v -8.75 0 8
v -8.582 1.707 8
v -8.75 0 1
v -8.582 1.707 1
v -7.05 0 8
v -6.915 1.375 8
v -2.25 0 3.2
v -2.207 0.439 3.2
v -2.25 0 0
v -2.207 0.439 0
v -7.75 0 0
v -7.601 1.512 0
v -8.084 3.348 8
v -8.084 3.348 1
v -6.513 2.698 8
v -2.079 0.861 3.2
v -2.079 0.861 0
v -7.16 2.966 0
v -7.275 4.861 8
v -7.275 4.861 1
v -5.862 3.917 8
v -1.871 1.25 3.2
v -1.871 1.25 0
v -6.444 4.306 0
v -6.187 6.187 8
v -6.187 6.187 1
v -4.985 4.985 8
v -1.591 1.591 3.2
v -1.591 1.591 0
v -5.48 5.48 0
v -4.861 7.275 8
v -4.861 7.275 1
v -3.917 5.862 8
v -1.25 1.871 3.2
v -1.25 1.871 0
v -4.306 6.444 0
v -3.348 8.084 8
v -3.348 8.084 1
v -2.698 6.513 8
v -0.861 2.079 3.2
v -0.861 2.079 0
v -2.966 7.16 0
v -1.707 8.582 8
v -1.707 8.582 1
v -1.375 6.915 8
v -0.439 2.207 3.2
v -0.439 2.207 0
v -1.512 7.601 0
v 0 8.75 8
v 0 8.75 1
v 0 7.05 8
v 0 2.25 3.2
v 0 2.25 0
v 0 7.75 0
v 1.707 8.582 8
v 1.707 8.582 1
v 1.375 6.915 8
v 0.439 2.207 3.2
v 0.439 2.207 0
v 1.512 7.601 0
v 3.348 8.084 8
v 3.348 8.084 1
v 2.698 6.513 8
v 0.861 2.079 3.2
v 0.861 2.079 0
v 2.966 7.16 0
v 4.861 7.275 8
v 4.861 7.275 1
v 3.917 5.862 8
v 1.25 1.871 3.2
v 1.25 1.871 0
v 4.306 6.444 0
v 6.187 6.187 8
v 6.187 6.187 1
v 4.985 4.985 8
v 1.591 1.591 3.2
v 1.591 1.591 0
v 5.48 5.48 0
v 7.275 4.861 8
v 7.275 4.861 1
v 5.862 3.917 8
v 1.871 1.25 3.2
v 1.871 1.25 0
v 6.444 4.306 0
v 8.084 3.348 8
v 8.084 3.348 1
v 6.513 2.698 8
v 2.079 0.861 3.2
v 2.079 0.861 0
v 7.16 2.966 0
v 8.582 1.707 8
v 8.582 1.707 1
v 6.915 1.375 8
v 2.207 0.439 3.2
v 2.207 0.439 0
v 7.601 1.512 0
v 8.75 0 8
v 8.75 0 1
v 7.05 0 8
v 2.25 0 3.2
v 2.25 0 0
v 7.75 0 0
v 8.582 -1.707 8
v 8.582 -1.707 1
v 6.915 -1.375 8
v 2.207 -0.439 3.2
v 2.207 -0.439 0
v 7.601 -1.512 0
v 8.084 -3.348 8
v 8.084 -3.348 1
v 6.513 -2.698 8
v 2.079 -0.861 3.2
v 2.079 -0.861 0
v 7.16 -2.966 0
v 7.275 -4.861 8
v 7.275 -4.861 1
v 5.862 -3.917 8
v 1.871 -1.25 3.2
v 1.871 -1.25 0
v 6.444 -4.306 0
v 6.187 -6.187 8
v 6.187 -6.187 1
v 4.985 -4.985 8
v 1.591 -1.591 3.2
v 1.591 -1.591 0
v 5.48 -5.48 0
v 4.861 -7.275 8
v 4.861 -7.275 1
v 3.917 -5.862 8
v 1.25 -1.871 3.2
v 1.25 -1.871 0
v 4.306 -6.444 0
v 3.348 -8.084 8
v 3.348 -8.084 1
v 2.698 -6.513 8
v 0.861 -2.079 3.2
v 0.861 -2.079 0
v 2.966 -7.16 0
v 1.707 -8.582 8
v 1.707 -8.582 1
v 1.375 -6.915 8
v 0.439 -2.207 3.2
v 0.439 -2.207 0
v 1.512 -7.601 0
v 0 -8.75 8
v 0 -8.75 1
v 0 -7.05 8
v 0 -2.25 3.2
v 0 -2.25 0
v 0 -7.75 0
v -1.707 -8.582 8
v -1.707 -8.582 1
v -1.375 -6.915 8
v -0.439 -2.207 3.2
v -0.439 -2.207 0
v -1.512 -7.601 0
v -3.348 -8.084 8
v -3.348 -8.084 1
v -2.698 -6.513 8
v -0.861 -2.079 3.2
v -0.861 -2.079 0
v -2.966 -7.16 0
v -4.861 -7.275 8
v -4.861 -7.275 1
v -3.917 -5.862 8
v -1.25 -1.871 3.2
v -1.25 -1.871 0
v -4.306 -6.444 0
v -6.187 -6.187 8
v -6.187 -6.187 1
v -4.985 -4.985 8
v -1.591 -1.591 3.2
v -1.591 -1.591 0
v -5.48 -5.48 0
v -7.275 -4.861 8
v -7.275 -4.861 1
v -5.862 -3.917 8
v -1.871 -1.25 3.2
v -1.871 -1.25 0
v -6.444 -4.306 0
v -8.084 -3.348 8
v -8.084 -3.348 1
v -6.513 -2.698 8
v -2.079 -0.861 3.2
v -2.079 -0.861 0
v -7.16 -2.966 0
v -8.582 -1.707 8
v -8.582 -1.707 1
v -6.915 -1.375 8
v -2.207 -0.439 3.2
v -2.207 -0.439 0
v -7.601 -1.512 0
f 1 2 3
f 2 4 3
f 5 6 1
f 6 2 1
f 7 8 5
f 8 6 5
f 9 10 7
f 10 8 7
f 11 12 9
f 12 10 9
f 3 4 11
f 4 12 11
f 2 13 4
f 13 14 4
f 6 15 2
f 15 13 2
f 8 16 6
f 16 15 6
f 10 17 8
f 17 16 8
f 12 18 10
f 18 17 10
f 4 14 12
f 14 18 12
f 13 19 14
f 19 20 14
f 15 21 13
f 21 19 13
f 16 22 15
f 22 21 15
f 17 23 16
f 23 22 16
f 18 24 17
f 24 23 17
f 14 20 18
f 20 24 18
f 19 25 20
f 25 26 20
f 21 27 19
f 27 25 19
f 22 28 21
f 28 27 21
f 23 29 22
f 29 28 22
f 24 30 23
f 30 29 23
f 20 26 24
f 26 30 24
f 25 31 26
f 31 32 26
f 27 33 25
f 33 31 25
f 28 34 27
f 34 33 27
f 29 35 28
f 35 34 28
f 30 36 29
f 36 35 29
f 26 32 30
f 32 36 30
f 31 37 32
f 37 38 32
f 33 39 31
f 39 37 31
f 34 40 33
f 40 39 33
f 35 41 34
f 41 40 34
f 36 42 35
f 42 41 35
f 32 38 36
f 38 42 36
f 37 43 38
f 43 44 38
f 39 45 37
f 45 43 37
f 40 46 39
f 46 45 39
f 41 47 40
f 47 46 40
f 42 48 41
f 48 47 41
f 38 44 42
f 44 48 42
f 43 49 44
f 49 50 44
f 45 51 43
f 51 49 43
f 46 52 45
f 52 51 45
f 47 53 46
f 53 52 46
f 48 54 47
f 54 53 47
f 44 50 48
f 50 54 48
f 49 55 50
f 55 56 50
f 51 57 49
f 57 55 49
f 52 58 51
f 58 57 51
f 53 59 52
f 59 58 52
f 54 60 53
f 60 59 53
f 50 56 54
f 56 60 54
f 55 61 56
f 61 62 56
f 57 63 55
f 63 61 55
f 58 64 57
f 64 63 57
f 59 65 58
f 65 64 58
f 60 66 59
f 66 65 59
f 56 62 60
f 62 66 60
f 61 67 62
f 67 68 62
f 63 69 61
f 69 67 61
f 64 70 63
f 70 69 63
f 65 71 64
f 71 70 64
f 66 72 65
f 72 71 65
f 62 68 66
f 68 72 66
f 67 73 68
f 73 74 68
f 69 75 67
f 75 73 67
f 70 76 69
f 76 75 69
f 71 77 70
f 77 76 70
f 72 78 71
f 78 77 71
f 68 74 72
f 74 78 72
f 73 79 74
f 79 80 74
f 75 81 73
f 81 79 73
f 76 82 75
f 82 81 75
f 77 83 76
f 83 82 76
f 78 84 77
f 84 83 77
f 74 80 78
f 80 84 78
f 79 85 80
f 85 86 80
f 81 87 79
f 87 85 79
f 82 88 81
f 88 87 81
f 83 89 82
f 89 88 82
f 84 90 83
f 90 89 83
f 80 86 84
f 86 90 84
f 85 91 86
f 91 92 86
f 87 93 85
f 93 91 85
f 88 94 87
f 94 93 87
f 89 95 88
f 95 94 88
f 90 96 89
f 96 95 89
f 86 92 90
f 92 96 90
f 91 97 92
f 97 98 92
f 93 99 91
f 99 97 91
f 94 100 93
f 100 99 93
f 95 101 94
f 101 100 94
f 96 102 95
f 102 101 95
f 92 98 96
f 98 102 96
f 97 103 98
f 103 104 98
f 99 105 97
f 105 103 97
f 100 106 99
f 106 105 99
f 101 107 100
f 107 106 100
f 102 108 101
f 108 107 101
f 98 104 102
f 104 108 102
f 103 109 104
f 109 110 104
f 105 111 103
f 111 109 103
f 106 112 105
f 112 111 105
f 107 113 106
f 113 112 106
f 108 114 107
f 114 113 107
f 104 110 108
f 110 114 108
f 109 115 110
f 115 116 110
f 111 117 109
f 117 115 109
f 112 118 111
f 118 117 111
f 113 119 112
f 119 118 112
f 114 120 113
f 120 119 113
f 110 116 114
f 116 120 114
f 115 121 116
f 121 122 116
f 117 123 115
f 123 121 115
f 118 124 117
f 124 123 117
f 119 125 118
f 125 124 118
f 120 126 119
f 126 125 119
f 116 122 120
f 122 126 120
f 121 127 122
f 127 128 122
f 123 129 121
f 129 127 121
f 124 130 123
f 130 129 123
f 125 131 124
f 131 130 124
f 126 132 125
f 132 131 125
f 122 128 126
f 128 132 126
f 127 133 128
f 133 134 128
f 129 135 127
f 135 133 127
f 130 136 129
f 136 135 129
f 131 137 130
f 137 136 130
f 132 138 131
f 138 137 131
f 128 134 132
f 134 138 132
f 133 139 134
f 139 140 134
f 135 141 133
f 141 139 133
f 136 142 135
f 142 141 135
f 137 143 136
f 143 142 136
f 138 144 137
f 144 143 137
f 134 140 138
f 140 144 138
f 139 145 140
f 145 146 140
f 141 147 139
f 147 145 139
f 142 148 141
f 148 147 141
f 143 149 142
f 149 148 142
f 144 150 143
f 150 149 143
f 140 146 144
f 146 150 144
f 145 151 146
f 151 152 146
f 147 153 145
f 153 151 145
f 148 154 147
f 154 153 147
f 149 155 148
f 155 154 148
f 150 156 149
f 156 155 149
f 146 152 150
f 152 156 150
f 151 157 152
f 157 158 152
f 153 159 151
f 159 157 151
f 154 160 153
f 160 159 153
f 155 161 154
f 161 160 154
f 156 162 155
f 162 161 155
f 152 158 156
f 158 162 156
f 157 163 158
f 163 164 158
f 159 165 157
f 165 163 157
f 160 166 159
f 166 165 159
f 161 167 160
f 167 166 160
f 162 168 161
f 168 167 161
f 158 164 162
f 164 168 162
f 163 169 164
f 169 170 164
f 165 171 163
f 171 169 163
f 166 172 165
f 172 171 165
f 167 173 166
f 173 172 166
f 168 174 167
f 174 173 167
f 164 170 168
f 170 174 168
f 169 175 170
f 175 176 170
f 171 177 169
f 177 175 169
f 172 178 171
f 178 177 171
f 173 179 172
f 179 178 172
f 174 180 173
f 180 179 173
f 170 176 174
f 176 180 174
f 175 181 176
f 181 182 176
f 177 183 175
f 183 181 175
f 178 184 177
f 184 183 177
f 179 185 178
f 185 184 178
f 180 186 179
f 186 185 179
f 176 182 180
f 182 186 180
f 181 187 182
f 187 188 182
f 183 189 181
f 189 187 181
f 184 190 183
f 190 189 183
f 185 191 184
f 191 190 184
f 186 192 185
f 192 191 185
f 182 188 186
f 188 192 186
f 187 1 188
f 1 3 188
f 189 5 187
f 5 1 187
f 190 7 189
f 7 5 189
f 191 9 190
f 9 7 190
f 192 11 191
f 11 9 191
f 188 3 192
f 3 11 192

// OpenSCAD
$fn = 32;

// ----------------------------------------------------------------------
// Form washer: countersunk washer, 17.5 mm outside, 4.5 mm bore
// ----------------------------------------------------------------------

// --- parameters (mm) ---
revolve_angle = 360;      // full turn around the Z axis
profile_points = 6;       // points of the closed outline

profile = [[2.25, 0], [7.75, 0], [8.75, 1], [8.75, 8], [7.05, 8], [2.25, 3.2]];  // single closed polygon, 6 points, counter clockwise

// --- the one profile operation ---
rotate_extrude(angle = revolve_angle) polygon(points = profile);
